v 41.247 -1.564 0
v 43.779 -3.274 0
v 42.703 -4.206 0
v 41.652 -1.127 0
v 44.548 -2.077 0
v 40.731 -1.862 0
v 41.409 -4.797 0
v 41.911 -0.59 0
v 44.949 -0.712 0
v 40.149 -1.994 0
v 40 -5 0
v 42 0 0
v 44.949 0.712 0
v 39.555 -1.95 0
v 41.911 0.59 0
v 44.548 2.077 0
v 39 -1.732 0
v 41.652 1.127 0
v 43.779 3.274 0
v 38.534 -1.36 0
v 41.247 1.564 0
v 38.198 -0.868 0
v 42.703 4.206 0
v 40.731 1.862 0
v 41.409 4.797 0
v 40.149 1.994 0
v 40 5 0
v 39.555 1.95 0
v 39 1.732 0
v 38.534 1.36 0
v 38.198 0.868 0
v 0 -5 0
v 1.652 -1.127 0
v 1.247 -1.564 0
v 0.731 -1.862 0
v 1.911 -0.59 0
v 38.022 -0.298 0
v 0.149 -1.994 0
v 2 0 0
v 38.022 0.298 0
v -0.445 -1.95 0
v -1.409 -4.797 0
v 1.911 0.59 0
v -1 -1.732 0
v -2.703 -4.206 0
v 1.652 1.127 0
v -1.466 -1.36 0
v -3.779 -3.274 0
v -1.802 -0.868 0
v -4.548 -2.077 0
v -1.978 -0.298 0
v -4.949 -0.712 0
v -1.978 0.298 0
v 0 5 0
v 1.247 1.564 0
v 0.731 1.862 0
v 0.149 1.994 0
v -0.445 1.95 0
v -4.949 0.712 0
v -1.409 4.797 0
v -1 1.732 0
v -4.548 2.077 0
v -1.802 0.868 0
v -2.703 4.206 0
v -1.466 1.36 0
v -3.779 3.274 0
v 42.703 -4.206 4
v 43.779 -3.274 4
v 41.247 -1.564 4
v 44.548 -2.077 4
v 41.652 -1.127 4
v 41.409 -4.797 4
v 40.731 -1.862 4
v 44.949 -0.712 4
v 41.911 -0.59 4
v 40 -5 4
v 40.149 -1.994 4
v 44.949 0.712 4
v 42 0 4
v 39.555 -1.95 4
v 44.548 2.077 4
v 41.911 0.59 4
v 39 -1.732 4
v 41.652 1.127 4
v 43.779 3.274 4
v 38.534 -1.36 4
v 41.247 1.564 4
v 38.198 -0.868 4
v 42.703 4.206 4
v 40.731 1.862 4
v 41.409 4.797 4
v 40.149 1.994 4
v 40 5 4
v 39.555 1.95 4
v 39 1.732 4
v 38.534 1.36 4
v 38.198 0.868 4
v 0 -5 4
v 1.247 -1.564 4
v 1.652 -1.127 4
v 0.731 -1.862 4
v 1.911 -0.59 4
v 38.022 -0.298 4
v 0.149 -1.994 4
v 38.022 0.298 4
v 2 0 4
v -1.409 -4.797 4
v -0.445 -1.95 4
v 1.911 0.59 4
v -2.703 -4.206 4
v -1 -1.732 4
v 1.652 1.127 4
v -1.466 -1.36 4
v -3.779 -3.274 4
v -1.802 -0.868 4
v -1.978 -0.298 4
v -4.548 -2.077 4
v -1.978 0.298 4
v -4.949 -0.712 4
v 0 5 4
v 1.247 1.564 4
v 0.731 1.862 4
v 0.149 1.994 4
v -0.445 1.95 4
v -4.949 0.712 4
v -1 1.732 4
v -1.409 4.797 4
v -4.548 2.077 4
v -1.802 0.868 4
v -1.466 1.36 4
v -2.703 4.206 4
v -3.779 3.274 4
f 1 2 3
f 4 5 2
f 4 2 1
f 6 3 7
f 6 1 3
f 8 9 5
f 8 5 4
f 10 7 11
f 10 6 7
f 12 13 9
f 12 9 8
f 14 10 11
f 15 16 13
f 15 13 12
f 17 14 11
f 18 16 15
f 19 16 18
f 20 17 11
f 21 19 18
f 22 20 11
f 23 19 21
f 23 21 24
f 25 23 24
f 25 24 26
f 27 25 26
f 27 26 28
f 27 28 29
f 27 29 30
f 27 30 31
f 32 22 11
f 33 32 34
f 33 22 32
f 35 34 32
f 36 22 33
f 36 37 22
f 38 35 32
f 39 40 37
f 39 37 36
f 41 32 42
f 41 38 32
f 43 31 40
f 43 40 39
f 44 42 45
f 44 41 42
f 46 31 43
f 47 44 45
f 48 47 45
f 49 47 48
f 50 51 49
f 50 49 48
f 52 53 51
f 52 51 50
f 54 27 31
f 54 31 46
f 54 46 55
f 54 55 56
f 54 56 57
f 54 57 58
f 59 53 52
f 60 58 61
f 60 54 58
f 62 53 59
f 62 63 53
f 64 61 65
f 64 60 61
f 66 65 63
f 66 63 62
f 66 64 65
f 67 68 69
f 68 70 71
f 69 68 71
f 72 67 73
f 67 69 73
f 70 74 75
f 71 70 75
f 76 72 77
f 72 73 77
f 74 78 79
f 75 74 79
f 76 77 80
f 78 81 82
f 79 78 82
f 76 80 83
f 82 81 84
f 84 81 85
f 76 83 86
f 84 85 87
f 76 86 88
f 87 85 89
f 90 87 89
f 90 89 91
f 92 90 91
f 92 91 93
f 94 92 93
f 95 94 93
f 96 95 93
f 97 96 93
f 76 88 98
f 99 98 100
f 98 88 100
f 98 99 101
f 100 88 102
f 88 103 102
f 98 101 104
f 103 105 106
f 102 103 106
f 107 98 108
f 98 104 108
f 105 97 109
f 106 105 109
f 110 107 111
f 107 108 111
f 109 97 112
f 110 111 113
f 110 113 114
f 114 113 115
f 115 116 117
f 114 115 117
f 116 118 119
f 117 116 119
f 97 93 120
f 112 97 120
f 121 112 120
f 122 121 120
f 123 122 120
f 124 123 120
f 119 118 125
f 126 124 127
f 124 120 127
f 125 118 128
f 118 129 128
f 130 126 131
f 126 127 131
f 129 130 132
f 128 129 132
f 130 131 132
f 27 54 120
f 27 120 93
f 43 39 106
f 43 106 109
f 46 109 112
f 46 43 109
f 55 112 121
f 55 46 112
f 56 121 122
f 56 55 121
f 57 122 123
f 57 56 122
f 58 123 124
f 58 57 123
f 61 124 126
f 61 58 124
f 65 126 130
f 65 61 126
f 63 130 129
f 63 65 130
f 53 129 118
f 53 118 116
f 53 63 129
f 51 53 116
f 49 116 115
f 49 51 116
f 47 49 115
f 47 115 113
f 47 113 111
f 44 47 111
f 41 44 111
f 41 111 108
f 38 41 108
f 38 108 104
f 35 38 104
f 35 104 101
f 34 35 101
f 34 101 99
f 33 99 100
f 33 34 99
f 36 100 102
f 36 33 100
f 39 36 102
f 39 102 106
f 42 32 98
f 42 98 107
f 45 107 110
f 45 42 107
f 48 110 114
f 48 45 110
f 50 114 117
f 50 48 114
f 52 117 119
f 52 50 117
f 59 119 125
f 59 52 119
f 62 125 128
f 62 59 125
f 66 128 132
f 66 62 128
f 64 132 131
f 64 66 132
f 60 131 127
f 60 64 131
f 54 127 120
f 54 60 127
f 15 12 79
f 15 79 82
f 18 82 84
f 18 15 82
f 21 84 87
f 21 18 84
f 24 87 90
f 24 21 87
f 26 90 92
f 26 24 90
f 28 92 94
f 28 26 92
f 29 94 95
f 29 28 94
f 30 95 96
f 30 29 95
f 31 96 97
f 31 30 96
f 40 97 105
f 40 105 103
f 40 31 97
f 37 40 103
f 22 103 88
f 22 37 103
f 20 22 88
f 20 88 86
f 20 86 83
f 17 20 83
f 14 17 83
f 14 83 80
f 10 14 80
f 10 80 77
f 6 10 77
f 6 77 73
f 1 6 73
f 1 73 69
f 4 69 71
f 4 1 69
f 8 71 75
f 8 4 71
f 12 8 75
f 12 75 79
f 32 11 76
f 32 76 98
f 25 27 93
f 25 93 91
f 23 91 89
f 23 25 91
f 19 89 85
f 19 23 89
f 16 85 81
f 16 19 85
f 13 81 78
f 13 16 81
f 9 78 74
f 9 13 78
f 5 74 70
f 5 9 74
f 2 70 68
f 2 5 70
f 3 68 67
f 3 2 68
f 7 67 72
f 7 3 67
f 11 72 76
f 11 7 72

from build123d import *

# Parameters (mm, degrees)
ESQUISSE1_R        = 2
BOSS_EXTRU_1_DEPTH = 4


with BuildPart() as part:
    # Esquisse1 → Boss.-Extru.1 (new body)
    with BuildSketch(Plane.XY):
        with BuildLine():
            Line((0, 5), (40, 5))
            ThreePointArc((40, 5), (45, 0), (40, -5))
            Line((40, -5), (0, -5))
            ThreePointArc((0, -5), (-5, 0), (0, 5))
        make_face()
        with Locations((40, 0)):
            Circle(ESQUISSE1_R, mode=Mode.SUBTRACT)
        Circle(ESQUISSE1_R, mode=Mode.SUBTRACT)
    extrude(amount=BOSS_EXTRU_1_DEPTH)


solid = part.part
